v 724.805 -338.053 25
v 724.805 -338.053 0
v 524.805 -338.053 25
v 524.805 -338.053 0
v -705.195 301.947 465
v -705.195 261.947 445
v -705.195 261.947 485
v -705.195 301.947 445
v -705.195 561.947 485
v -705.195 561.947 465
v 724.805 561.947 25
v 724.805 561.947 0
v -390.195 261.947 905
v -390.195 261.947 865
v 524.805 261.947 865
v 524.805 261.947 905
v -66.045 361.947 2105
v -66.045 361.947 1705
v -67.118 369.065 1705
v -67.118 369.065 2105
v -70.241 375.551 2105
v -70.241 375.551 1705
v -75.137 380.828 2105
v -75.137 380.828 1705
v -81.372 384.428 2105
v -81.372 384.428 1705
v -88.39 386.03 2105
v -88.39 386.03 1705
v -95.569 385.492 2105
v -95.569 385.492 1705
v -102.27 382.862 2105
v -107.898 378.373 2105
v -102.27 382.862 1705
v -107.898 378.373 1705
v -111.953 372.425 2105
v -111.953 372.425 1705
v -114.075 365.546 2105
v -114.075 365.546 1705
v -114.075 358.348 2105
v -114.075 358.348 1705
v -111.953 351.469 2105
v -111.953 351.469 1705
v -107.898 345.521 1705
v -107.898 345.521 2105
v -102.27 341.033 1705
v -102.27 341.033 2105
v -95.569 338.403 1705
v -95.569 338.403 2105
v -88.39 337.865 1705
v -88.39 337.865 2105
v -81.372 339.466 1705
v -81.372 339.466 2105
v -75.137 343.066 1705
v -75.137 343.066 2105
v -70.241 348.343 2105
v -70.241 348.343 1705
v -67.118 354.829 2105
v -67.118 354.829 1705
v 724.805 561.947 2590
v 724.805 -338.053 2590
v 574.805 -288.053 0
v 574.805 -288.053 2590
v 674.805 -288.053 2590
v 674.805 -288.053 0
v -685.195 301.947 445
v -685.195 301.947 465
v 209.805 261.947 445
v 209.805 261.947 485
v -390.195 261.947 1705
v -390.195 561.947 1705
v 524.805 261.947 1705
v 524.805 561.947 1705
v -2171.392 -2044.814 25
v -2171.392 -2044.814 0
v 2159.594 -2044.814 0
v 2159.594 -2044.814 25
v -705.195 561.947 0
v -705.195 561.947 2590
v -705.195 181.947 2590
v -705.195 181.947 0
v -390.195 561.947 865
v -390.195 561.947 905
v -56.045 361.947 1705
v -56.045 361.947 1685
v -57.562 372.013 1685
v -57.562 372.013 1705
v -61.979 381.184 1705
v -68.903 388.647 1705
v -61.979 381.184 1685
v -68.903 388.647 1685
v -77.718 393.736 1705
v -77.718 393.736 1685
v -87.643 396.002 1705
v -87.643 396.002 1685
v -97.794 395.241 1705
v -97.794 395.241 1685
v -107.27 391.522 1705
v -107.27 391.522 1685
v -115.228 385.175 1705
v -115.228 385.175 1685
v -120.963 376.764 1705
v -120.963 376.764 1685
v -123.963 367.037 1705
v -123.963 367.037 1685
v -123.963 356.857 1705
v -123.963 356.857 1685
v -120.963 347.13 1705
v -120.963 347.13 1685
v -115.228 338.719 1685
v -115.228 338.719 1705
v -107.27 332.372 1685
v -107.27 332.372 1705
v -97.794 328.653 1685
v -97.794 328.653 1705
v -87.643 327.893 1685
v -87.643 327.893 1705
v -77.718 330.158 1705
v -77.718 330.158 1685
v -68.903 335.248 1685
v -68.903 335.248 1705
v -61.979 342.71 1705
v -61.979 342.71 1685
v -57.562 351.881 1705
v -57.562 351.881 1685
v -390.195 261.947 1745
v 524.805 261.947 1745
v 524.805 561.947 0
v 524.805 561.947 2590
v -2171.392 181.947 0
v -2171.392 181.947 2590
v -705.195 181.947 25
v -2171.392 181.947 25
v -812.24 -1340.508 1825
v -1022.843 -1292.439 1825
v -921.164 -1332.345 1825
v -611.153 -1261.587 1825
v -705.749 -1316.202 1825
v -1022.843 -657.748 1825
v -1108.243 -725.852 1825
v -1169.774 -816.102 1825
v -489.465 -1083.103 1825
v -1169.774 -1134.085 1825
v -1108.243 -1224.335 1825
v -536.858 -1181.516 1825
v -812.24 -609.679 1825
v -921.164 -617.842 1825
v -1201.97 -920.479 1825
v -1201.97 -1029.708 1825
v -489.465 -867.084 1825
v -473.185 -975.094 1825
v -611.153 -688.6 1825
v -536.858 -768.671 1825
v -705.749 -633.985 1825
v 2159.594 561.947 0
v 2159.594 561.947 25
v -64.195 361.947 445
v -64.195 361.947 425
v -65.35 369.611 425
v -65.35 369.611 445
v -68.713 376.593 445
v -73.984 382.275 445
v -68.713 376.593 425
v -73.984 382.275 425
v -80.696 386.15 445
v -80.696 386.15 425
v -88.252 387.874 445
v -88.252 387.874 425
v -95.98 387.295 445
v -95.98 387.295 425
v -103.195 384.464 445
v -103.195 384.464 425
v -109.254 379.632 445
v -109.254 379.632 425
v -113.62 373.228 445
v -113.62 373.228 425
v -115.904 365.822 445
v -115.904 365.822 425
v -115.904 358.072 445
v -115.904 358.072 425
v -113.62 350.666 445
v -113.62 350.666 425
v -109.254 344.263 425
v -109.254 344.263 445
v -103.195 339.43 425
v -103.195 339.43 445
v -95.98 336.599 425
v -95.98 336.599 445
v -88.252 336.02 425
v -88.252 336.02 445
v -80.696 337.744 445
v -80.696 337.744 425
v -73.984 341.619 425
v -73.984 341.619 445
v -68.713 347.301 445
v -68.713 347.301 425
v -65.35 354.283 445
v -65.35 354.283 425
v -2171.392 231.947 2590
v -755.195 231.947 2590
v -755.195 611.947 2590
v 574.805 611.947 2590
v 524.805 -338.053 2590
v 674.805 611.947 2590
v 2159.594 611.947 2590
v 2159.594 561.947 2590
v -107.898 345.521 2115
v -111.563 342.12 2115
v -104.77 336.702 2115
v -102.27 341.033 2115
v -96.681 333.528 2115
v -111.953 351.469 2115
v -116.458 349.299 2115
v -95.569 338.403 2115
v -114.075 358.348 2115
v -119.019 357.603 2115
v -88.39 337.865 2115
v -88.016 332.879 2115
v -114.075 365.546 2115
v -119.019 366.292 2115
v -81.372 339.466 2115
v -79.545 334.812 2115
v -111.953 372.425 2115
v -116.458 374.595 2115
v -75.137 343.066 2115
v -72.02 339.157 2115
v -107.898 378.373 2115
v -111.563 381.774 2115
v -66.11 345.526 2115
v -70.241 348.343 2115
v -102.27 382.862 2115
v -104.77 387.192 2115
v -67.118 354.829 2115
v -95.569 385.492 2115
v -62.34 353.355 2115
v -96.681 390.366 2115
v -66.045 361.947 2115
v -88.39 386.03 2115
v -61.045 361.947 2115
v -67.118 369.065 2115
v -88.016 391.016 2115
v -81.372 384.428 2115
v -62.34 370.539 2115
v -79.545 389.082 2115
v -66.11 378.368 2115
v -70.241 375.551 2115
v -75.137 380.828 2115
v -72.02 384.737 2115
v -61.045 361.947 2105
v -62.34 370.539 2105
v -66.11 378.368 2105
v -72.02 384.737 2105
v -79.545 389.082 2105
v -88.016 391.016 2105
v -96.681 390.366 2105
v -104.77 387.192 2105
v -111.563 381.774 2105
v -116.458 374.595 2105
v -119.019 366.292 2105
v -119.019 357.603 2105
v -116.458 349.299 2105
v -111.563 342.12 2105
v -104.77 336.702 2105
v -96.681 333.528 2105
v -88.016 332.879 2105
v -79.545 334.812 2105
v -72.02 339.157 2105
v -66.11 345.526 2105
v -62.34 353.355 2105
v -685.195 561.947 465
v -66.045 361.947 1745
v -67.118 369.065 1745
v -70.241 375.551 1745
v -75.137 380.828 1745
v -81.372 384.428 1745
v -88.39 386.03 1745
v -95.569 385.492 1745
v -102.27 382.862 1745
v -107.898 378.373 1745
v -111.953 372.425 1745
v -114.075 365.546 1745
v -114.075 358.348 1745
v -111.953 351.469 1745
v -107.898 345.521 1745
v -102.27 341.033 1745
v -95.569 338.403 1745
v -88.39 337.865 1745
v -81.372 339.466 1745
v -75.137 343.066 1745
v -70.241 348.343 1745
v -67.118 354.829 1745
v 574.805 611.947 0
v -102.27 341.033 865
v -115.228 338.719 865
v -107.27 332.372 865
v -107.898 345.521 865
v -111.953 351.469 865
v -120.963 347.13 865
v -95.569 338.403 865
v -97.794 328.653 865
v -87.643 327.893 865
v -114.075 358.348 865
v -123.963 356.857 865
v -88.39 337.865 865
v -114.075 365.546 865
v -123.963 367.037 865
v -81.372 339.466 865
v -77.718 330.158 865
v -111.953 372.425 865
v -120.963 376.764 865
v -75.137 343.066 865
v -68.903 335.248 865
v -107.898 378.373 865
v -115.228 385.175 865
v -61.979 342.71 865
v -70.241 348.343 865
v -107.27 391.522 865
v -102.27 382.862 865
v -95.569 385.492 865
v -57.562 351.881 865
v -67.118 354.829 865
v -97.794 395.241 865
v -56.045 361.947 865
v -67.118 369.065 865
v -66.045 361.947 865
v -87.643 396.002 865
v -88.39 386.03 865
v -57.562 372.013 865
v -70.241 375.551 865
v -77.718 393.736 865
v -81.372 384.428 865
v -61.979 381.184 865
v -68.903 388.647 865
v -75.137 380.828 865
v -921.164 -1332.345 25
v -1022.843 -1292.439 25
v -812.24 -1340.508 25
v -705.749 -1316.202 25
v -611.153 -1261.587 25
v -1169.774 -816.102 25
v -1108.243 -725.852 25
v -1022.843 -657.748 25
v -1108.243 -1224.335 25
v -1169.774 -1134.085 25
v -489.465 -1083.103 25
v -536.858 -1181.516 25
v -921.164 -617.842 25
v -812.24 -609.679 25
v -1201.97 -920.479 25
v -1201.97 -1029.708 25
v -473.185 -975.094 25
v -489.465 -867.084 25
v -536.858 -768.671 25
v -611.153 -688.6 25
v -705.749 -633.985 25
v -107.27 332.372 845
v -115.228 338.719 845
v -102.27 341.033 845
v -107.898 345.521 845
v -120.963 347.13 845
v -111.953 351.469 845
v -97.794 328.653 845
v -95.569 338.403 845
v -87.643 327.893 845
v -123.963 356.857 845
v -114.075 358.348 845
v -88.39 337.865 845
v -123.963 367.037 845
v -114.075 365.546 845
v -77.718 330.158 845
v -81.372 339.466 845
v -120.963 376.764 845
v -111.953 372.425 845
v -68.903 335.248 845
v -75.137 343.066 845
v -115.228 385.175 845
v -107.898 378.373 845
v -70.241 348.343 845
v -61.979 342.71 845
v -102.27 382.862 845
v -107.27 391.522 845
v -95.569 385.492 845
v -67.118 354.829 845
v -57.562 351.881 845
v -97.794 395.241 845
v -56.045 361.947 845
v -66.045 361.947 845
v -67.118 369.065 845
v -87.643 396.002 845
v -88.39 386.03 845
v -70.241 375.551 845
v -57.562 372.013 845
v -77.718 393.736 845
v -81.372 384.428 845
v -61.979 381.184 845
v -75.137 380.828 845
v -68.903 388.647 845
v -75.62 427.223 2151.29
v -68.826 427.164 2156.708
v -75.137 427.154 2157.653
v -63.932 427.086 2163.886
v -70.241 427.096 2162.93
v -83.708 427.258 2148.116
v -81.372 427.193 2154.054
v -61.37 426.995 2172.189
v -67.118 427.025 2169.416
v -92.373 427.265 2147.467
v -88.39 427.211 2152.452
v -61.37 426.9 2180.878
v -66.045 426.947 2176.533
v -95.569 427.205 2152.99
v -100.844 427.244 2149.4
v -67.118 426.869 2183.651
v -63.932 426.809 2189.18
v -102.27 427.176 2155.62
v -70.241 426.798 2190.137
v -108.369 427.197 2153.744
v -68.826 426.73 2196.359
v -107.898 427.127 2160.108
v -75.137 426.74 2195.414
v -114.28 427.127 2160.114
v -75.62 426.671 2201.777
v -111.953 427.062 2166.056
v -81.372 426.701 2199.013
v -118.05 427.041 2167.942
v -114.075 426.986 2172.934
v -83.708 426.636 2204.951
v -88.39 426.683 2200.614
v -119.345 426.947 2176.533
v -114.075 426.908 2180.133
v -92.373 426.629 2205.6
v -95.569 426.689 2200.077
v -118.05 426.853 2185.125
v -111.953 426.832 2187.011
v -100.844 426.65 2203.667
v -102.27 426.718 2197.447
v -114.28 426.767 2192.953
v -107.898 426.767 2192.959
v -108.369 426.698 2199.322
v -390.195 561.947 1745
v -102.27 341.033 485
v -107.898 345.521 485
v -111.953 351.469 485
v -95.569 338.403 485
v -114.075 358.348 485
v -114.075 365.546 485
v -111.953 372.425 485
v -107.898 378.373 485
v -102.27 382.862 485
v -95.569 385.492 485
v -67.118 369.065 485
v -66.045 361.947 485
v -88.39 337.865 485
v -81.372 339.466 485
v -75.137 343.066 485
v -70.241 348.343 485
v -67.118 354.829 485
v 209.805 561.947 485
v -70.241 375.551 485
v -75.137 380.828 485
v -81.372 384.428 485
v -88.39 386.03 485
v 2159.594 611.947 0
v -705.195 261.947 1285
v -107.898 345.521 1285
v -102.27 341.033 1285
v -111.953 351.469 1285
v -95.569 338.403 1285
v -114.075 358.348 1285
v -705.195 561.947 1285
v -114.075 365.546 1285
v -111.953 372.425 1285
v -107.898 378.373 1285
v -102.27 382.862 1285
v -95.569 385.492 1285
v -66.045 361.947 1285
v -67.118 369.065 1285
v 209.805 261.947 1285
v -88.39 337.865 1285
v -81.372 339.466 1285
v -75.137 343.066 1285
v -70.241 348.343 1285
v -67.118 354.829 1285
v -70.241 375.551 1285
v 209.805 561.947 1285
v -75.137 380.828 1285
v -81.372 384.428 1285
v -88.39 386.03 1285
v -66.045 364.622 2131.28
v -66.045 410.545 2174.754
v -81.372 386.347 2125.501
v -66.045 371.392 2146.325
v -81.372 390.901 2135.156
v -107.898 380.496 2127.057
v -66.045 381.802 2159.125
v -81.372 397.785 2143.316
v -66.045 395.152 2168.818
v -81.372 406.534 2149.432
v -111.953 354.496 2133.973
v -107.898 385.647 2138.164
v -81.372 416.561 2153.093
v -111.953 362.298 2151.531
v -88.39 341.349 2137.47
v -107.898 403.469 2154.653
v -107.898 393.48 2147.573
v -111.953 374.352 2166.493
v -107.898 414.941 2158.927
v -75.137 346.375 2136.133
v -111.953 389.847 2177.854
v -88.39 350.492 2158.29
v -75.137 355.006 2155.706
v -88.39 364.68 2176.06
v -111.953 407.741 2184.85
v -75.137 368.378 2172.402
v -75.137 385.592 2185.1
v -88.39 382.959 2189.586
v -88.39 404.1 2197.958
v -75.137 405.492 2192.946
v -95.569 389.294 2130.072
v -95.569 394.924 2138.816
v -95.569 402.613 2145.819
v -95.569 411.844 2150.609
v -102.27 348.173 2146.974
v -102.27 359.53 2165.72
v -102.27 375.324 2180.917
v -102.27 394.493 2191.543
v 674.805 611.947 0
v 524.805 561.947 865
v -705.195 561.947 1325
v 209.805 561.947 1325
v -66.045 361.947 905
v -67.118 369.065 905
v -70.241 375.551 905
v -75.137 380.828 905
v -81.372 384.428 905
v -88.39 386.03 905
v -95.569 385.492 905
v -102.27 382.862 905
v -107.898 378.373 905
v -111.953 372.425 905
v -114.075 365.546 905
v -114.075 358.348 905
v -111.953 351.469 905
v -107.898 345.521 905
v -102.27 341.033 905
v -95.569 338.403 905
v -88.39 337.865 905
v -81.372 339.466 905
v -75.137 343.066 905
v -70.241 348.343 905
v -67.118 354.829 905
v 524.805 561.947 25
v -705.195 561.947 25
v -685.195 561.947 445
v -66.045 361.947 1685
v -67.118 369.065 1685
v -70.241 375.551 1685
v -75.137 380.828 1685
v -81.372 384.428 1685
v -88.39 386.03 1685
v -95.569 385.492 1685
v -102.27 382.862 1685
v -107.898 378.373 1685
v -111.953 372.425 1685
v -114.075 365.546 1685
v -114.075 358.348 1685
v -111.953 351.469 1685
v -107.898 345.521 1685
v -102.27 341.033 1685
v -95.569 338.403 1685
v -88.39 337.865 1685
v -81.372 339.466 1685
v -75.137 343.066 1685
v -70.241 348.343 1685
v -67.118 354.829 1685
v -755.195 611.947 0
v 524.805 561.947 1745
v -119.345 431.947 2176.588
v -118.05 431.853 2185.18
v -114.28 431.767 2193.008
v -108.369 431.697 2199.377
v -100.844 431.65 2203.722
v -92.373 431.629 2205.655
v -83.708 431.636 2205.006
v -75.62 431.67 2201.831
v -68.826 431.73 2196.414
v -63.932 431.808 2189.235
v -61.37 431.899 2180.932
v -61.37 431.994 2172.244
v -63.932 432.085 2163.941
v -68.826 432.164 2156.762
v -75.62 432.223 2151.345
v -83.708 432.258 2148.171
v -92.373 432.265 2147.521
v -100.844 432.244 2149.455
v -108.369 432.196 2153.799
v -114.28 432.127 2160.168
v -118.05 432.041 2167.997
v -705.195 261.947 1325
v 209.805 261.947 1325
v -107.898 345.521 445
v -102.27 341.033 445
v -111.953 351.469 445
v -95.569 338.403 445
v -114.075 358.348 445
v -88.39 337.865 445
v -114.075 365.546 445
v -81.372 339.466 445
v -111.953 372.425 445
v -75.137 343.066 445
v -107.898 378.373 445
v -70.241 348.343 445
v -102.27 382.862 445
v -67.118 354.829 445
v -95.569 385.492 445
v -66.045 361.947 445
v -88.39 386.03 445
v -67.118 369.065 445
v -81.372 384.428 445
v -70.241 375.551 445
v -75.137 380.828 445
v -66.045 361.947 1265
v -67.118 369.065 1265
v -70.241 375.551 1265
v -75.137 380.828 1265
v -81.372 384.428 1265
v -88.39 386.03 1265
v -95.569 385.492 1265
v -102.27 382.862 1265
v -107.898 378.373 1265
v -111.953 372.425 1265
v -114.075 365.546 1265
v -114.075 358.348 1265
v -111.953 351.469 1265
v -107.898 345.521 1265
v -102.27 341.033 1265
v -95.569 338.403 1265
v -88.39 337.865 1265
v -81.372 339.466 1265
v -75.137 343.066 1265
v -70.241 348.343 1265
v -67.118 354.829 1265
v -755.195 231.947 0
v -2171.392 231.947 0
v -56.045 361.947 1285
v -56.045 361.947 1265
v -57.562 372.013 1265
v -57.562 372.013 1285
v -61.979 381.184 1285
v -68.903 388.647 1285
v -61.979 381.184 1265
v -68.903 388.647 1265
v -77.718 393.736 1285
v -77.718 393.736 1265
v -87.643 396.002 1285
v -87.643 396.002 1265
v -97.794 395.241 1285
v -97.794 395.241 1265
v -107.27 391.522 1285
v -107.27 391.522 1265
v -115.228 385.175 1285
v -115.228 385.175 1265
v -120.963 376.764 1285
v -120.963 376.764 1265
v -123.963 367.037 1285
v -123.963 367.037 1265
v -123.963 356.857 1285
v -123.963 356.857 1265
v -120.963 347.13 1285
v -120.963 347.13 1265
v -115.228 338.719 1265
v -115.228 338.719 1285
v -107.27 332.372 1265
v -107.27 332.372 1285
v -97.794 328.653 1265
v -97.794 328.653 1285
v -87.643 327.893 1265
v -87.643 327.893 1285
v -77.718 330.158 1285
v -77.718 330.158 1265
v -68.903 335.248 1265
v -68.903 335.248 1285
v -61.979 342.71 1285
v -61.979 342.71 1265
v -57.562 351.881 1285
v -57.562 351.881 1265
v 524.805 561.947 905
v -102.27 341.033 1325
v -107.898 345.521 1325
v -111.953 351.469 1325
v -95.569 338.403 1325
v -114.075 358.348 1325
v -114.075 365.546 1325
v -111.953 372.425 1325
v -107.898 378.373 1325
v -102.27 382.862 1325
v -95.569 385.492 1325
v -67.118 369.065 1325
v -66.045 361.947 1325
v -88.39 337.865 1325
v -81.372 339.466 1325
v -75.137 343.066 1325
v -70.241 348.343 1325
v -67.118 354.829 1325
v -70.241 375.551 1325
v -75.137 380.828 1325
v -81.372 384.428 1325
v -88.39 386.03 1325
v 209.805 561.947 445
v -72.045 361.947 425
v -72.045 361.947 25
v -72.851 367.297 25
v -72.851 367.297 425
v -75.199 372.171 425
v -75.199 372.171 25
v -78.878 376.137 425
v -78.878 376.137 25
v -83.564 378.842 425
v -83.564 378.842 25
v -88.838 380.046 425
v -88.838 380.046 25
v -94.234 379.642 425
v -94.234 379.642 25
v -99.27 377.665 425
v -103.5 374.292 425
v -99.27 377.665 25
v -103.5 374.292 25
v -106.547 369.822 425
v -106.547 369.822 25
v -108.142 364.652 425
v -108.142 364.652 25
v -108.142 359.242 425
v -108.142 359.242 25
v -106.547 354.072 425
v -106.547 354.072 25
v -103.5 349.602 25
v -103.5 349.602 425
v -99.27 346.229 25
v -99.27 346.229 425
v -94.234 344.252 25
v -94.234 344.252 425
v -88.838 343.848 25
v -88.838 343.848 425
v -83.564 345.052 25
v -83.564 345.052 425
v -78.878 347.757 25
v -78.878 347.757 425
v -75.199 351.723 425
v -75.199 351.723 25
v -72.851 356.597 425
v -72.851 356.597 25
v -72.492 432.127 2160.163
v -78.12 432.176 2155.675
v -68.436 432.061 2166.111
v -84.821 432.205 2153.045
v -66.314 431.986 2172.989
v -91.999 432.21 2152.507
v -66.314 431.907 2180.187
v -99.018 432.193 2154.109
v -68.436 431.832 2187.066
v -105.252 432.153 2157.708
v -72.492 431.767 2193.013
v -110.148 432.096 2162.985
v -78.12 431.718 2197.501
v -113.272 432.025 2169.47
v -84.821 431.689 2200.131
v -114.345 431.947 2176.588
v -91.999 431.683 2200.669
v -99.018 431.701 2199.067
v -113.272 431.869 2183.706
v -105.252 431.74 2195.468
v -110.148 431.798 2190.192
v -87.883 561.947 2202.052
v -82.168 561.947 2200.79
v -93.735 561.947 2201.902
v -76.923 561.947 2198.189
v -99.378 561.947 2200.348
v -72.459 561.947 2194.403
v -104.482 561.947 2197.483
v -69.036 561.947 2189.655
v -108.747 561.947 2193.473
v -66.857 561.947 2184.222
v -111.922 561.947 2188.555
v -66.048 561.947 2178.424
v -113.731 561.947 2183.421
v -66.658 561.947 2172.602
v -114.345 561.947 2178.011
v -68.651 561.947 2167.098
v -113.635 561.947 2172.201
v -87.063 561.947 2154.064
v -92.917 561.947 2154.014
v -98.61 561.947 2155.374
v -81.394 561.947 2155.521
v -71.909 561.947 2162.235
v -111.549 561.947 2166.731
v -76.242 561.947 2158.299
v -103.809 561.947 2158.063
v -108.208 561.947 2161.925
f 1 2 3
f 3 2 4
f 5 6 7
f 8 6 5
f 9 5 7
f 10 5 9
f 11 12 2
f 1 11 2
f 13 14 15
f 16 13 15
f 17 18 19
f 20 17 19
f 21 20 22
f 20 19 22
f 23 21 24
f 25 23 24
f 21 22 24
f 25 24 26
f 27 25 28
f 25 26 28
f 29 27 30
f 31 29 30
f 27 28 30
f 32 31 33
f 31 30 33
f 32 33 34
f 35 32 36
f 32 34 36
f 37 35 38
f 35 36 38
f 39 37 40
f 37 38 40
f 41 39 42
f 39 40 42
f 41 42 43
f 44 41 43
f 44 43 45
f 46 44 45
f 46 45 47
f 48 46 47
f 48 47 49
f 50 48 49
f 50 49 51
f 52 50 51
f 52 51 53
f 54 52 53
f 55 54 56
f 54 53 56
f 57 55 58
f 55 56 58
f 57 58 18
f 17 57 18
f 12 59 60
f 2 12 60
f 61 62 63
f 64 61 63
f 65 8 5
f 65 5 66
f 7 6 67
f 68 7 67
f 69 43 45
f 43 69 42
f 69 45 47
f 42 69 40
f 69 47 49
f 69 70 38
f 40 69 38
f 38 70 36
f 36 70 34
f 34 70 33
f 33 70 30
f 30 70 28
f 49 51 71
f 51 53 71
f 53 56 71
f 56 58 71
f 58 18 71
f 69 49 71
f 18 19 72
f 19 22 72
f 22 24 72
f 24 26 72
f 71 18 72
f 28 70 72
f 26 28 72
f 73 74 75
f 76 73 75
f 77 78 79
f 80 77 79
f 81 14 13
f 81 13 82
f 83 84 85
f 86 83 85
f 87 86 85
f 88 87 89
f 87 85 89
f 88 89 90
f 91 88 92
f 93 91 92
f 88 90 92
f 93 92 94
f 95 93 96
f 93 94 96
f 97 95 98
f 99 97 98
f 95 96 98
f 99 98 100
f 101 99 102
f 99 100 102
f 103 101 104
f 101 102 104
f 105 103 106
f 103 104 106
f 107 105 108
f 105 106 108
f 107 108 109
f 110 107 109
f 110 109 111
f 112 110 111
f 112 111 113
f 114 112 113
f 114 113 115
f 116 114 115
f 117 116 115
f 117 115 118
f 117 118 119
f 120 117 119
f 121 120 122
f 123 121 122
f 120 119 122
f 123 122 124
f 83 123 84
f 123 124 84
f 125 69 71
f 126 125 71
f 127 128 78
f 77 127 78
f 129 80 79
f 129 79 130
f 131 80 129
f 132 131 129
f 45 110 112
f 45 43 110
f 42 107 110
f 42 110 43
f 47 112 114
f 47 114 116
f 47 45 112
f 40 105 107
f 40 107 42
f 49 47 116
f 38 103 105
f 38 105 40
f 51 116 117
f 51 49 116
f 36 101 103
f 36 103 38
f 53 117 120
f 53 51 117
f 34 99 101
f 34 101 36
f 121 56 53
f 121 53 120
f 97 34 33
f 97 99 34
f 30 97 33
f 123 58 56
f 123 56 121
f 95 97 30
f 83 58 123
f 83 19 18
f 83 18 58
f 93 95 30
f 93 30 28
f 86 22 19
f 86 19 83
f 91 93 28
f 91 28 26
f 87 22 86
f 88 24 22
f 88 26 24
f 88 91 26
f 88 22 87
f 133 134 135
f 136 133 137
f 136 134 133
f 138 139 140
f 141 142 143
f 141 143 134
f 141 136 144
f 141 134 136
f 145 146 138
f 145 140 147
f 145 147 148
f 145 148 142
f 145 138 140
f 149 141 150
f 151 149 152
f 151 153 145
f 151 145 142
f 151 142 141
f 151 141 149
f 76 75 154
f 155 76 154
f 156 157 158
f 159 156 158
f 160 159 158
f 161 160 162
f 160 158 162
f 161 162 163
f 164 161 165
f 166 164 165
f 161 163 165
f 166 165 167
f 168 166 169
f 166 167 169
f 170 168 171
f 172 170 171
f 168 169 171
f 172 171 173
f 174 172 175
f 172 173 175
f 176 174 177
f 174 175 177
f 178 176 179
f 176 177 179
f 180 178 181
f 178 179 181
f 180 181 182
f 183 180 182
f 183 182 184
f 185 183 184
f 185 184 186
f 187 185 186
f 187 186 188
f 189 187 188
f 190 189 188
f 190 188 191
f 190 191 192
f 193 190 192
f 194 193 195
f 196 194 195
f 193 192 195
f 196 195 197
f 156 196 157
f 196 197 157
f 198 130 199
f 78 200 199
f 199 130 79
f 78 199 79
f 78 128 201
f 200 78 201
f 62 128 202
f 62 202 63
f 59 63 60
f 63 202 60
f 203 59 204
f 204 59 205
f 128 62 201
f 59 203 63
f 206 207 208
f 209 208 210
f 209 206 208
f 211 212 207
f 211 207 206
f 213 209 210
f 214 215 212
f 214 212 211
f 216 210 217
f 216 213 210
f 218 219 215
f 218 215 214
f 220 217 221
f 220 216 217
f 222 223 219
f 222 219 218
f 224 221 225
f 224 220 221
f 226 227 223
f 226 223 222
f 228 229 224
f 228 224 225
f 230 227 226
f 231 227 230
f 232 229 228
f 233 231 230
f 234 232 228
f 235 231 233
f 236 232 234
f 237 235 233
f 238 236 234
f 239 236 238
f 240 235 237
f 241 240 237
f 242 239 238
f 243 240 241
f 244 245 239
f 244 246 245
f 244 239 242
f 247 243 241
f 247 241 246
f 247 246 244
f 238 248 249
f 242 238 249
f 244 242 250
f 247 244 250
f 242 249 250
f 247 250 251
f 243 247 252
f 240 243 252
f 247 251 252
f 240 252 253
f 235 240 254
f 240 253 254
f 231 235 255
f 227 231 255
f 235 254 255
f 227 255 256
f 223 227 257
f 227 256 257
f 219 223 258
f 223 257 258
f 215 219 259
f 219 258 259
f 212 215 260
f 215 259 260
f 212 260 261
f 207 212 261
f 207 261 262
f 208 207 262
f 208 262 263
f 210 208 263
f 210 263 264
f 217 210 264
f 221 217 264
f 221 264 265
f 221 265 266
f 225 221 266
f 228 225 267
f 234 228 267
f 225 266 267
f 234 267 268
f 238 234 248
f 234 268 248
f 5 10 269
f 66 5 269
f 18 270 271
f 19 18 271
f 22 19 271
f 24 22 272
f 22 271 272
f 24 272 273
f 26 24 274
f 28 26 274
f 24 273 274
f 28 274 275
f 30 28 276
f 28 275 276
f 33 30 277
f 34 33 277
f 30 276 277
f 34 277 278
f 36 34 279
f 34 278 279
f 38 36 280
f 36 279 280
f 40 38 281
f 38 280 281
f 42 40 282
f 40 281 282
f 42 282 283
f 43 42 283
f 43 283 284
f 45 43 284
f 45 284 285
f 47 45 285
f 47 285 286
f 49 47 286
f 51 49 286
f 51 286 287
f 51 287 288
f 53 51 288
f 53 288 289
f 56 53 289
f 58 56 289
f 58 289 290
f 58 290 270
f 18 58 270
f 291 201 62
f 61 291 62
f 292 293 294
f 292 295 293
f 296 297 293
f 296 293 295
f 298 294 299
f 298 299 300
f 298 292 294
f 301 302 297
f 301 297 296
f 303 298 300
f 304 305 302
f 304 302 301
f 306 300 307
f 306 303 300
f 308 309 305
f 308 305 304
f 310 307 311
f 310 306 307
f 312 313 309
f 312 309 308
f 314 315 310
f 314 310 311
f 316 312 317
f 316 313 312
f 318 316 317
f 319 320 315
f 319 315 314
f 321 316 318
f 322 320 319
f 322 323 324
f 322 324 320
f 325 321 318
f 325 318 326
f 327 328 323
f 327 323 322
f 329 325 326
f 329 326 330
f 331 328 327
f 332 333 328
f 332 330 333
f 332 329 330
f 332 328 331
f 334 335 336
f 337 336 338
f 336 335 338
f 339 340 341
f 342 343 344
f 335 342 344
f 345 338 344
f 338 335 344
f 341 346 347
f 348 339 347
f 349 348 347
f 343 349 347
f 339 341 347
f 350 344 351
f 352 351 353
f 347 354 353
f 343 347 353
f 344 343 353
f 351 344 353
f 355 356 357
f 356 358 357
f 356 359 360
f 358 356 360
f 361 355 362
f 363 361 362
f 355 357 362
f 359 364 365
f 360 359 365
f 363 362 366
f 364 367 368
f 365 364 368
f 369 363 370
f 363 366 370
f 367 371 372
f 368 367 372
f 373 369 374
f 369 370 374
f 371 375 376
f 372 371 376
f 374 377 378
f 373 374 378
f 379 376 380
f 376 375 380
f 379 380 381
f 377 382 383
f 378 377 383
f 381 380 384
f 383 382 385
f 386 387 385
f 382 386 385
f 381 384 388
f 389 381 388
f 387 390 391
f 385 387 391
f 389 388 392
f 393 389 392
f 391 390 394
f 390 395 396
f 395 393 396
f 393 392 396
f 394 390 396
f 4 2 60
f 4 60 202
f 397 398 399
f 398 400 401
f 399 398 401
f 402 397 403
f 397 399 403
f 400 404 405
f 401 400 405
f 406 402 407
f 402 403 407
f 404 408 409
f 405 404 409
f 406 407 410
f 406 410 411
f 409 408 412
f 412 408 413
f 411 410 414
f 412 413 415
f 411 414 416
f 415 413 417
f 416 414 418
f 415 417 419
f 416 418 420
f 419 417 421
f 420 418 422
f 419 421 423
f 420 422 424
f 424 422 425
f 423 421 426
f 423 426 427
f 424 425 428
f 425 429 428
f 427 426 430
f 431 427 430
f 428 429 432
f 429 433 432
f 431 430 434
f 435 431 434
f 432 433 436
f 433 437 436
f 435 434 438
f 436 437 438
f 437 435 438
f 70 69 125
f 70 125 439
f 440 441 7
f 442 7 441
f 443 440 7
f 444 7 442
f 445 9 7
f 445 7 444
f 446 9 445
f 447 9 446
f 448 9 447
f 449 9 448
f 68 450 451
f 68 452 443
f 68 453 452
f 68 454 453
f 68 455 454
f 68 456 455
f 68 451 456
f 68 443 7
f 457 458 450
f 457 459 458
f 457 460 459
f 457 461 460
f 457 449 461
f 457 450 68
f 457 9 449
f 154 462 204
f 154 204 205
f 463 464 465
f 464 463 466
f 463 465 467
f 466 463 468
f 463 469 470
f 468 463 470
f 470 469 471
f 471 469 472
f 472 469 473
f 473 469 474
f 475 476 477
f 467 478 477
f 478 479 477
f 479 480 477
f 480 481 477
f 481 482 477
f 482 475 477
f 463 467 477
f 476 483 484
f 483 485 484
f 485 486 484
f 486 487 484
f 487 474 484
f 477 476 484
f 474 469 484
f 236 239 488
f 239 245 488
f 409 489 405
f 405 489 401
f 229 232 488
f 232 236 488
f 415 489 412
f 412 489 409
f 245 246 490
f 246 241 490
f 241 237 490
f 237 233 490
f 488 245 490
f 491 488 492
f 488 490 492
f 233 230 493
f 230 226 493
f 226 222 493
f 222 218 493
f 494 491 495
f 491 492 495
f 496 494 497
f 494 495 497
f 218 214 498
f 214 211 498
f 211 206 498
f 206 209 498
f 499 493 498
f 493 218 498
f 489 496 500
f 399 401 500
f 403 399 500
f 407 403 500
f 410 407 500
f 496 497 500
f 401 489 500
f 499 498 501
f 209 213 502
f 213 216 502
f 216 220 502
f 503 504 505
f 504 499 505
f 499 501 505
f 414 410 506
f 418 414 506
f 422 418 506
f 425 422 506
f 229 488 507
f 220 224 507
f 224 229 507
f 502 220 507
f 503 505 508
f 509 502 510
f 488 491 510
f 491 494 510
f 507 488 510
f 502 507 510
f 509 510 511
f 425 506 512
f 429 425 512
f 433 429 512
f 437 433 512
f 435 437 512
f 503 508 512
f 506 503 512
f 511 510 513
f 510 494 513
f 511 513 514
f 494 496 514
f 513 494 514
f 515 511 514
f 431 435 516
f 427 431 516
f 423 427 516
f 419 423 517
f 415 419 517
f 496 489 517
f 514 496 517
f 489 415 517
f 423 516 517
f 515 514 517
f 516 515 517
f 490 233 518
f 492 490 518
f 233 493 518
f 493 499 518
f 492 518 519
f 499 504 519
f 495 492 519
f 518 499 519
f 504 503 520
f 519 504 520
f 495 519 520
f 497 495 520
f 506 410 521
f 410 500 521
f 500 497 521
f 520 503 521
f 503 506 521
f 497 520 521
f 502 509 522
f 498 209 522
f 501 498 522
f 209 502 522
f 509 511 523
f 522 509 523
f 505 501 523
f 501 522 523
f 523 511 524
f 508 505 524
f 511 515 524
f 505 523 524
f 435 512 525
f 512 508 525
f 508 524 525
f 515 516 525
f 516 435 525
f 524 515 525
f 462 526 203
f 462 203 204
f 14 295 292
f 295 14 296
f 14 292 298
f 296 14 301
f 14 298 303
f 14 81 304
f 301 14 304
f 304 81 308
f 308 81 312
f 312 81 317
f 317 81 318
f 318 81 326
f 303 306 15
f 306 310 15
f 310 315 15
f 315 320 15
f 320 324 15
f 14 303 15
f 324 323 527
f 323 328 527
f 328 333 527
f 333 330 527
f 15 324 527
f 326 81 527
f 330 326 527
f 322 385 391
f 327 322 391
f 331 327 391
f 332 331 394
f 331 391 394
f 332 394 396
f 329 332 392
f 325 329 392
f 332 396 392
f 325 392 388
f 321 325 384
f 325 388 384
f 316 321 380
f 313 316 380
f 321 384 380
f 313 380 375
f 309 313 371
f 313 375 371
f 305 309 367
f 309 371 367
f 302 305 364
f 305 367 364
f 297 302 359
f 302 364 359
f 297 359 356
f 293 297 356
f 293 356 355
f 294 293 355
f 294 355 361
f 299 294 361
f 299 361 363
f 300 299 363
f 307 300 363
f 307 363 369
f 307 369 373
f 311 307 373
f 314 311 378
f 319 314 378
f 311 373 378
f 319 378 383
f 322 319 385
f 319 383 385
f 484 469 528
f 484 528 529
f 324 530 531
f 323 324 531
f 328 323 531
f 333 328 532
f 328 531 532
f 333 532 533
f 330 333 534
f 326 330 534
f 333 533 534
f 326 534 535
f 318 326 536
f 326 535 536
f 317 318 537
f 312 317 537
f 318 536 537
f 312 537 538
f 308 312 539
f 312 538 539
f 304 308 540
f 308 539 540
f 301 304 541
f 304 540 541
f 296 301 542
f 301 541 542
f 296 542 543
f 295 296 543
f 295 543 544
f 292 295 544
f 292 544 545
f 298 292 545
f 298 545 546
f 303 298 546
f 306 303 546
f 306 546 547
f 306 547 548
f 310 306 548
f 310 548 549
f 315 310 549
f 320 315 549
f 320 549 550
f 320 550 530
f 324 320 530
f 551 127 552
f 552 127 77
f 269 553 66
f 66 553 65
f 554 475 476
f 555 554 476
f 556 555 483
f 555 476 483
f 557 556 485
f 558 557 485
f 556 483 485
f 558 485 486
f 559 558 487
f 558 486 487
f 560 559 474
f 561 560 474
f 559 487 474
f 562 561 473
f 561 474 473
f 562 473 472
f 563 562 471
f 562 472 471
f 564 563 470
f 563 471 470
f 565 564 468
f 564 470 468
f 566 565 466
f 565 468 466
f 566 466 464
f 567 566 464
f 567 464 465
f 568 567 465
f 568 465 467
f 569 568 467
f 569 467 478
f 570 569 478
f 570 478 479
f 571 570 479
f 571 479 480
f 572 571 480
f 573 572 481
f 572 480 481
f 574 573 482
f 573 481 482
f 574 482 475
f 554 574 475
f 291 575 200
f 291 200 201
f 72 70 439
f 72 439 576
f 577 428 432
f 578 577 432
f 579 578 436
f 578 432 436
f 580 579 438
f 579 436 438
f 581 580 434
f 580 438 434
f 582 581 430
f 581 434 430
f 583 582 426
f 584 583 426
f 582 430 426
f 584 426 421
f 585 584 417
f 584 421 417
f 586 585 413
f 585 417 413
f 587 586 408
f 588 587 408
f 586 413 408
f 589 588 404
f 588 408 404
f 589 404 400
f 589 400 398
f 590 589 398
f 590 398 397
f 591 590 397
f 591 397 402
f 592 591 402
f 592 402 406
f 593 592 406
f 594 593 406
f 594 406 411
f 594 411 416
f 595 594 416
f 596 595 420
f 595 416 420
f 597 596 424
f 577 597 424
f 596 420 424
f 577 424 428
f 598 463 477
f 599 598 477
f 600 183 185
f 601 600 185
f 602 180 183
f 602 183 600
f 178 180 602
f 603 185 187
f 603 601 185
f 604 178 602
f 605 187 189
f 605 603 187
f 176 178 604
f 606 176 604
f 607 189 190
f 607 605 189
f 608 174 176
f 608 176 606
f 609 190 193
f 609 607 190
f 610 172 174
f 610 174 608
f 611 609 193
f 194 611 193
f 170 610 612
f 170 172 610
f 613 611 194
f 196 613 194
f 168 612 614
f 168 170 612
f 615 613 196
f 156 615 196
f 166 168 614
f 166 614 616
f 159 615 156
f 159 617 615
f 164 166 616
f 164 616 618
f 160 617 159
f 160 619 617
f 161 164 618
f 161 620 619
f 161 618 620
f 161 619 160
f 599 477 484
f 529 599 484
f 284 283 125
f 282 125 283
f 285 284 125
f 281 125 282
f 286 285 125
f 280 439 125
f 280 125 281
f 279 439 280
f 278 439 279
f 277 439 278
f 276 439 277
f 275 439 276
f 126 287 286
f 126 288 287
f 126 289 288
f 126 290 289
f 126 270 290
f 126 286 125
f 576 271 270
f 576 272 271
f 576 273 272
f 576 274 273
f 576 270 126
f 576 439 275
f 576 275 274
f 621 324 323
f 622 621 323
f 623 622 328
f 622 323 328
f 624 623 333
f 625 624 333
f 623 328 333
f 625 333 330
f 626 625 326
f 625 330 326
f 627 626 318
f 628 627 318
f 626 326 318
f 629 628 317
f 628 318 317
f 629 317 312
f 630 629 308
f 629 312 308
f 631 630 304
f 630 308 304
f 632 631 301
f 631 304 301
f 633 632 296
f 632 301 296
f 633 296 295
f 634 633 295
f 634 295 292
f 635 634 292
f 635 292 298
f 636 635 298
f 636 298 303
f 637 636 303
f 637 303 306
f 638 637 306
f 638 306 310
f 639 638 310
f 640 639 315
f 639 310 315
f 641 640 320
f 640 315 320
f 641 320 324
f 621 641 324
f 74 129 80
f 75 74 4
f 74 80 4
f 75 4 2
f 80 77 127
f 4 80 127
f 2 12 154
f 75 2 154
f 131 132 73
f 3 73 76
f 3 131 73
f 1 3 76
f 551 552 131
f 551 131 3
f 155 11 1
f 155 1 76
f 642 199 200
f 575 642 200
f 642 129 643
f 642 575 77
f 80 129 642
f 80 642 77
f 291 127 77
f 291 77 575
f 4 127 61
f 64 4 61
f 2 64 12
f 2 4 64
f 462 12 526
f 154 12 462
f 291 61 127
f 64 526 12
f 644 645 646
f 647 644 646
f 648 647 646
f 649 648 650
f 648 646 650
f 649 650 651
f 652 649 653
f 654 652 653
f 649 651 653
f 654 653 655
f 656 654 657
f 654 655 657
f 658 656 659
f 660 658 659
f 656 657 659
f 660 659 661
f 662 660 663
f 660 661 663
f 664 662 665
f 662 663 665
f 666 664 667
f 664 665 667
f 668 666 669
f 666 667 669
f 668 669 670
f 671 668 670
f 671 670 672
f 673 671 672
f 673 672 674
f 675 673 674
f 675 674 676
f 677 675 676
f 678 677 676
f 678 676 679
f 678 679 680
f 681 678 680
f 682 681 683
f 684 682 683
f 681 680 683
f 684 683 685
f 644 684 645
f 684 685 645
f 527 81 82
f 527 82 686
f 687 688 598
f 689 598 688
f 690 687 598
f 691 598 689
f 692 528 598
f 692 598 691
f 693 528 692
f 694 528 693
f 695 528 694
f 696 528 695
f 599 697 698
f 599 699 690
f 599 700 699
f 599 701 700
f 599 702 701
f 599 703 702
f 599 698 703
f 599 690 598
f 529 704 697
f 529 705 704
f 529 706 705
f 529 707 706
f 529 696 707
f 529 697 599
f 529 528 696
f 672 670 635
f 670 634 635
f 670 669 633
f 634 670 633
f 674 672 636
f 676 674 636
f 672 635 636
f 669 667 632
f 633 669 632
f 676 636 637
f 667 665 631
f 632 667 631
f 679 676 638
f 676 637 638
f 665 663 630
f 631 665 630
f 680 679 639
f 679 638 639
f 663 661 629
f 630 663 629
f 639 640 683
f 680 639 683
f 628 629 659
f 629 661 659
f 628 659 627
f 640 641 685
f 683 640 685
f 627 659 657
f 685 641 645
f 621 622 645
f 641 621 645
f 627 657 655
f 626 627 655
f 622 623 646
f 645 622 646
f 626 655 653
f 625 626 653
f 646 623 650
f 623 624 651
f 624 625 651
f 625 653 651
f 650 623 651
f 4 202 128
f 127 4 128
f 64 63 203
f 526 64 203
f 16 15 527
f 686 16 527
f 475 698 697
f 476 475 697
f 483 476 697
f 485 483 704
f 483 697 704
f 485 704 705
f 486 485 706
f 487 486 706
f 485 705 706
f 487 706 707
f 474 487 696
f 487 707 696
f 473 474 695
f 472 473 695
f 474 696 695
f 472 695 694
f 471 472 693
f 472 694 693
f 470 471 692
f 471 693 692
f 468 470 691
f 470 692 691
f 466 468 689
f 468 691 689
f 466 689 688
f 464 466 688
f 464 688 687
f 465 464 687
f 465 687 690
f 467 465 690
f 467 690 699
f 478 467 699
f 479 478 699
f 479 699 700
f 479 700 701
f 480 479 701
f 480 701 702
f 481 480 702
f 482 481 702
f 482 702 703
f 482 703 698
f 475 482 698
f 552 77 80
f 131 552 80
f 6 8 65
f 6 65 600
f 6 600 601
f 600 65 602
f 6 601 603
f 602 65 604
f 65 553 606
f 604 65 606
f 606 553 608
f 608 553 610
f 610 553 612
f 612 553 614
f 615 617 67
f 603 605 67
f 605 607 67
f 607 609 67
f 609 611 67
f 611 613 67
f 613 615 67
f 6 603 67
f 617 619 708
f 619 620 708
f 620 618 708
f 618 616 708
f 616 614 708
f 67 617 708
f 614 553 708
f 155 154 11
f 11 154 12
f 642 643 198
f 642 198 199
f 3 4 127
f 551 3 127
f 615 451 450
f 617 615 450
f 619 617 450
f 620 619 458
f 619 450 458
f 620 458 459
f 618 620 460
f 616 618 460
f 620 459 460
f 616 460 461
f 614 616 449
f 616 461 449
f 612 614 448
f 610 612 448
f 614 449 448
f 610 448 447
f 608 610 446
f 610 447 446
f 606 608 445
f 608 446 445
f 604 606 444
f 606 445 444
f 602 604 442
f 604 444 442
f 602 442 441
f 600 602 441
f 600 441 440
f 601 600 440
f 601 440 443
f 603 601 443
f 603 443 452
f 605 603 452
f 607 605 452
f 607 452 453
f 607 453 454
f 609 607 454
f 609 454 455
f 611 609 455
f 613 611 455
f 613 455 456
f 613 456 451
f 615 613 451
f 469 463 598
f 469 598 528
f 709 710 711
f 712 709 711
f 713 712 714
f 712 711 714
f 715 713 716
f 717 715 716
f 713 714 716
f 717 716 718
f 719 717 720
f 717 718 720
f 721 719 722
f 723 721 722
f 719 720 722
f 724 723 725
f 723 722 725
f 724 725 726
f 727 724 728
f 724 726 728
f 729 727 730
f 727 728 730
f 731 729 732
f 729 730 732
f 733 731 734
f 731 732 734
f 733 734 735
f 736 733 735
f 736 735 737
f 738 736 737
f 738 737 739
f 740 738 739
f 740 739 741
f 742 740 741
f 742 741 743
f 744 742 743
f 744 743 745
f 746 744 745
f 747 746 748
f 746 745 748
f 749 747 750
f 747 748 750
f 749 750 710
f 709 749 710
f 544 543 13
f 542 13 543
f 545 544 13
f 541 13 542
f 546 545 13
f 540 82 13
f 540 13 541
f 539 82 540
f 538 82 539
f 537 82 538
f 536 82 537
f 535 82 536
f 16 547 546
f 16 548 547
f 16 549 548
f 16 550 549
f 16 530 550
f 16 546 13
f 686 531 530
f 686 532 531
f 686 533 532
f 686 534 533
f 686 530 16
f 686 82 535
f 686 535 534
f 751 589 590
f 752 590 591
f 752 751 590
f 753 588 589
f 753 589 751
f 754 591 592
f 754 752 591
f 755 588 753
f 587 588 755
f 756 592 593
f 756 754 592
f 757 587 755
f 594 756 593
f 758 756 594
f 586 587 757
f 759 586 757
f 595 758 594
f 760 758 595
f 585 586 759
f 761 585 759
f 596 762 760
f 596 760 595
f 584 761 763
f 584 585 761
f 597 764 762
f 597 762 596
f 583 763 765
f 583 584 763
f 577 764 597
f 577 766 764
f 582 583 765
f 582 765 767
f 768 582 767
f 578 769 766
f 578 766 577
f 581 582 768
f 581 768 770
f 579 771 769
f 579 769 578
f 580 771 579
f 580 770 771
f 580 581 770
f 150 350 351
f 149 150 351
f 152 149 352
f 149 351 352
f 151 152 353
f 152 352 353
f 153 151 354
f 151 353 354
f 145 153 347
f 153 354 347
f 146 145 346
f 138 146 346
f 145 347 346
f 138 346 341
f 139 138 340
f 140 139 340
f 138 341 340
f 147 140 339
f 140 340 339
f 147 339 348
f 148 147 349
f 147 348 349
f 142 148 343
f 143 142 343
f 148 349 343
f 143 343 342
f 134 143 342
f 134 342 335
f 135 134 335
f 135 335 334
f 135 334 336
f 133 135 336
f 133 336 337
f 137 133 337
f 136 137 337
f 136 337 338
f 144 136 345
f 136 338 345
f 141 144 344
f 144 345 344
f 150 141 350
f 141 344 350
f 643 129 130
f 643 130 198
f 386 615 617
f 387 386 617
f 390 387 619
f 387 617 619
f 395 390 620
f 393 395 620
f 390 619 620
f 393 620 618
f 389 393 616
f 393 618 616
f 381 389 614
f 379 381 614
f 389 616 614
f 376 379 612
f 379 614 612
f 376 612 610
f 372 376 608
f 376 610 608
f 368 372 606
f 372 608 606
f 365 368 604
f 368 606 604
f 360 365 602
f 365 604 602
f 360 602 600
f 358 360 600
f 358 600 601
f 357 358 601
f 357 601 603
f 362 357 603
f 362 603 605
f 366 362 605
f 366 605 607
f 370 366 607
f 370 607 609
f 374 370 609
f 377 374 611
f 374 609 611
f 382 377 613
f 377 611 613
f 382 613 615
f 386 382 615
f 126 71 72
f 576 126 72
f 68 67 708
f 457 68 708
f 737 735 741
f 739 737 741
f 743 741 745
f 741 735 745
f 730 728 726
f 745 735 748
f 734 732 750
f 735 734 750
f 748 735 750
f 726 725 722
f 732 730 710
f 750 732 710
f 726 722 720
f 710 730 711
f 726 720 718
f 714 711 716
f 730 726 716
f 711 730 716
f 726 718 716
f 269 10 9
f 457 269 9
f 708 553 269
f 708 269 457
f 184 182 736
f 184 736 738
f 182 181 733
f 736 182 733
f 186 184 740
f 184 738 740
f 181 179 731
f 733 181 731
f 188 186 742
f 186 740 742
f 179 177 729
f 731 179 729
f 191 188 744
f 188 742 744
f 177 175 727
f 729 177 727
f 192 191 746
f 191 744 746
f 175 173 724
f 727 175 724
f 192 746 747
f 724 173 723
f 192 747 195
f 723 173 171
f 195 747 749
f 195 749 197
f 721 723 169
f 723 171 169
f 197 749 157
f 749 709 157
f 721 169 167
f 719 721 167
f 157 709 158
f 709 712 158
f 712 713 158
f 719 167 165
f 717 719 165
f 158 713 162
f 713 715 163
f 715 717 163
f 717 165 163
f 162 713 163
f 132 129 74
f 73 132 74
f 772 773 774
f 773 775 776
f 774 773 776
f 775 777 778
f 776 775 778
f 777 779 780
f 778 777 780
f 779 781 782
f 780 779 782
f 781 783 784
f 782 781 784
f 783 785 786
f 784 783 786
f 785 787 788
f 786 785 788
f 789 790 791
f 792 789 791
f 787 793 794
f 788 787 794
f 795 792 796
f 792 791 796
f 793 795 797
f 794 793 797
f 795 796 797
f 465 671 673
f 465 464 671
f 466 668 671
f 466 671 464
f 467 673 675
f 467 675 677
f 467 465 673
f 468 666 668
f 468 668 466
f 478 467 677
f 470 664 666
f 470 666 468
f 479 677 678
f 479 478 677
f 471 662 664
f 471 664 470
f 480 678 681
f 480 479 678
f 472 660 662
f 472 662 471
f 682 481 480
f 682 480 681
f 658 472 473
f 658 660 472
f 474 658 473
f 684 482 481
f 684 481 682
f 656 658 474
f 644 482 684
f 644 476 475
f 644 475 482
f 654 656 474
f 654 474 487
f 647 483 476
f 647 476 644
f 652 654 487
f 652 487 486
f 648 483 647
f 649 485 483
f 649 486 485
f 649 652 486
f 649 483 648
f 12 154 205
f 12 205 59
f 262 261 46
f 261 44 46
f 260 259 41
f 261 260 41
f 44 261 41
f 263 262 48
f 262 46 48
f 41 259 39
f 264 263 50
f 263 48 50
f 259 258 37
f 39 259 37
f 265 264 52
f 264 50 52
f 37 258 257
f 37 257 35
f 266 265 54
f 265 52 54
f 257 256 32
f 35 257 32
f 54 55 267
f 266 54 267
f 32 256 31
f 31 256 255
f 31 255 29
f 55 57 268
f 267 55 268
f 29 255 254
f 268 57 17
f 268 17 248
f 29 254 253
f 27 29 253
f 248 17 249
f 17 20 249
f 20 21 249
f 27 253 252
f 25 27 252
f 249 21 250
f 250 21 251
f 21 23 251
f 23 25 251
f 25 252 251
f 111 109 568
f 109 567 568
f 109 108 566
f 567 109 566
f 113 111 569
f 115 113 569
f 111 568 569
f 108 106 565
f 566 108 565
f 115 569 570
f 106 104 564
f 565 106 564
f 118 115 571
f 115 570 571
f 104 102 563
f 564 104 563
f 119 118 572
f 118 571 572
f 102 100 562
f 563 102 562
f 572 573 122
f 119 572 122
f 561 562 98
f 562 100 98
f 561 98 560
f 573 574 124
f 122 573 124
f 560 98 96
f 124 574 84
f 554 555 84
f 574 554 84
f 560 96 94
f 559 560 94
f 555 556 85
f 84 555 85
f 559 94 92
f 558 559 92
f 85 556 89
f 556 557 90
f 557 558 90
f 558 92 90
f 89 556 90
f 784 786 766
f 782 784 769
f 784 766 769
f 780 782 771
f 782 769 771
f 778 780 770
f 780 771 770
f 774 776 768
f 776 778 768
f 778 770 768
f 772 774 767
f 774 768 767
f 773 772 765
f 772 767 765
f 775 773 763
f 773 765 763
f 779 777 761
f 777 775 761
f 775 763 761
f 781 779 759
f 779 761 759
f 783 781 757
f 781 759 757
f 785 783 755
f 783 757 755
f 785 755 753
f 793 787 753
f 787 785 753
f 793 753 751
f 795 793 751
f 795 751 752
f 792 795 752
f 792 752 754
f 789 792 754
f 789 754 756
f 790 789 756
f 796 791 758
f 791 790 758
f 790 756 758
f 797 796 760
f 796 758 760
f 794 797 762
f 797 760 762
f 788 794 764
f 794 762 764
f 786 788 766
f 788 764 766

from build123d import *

# Parameters (mm, degrees)
F1_DEPTH  = 25
F3_DEPTH  = 2590
F9_W      = 915
F9_H      = 300
F10_DEPTH = 40
F11_W     = 915
F11_H     = 300
F12_DEPTH = 40
F13_W     = 915
F13_H     = 300
F14_DEPTH = 40
F15_W     = 915
F15_H     = 300
F16_DEPTH = 40
F17_R     = 18.15
F18_DEPTH = 400
F19_R     = 24.15
F20_DEPTH = 1320
F21_R     = 26
F22_DEPTH = 20
F23_R     = 24.15
F24_DEPTH = 400
F25_R     = 34.15
F26_DEPTH = 20
F27_R     = 24.15
F28_DEPTH = 400
F29_R     = 34.15
F30_DEPTH = 20
F31_R     = 24.15
F32_DEPTH = 400
F33_R     = 34.15
F34_DEPTH = 20
F35_R     = 24.15
F36_DEPTH = 400
F37_R     = 29.15
F38_DEPTH = 10
F42_R     = 24.15
F47_R     = 29.15
F48_DEPTH = 5
F49_R     = 24.15
F50_REACH = 252.8226248047
F51_R     = 366.4389442896
F52_DEPTH = 1800
F53_W     = 20
F53_H     = 260
F54_DEPTH = 20


with BuildPart() as f1:
    # F0 (on Top) → F1 (new body)
    with BuildSketch(Plane.XY):
        Polygon((-705.1947621593, 181.9470898961), (-2171.3920796187, 181.9470898961), (-2171.3920796187, -2044.813666757), (2159.594360915, -2044.813666757), (2159.594360915, 561.9470898961), (724.8052378407, 561.9470898961), (724.8052378407, -338.0529101039), (524.8052378407, -338.0529101039), (524.8052378407, 561.9470898961), (-705.1947621593, 561.9470898961), align=None)
    extrude(amount=F1_DEPTH)


with BuildPart() as f3:
    # F2 (on face) → F3 (new body)
    with BuildSketch(Plane(origin=(0, 0, 0), x_dir=(1, 0, 0), z_dir=(0, 0, -1))):
        Polygon((-705.1947621593, -181.9470898961), (-2171.3920796187, -181.9470898961), (-2171.3920796187, -231.9470898961), (-755.1947621593, -231.9470898961), (-755.1947621593, -611.9470898961), (574.8052378407, -611.9470898961), (574.8052378407, 288.0529101039), (674.8052378407, 288.0529101039), (674.8052378407, -611.9470898961), (2159.594360915, -611.9470898961), (2159.594360915, -561.9470898961), (724.8052378407, -561.9470898961), (724.8052378407, 338.0529101039), (524.8052378407, 338.0529101039), (524.8052378407, -561.9470898961), (-705.1947621593, -561.9470898961), align=None)
    extrude(amount=-F3_DEPTH)


with BuildPart() as f10:
    # F9 (on offset) → F10 (new body)
    with BuildSketch(Plane.XY.offset(445)):
        with Locations((-247.6947621593, 411.9470898961)):
            Rectangle(F9_W, F9_H)
    extrude(amount=F10_DEPTH)


with BuildPart() as f12:
    # F11 (on offset) → F12 (new body)
    with BuildSketch(Plane.XY.offset(865)):
        with Locations((67.3052378407, 411.9470898961)):
            Rectangle(F11_W, F11_H)
    extrude(amount=F12_DEPTH)


with BuildPart() as f14:
    # F13 (on offset) → F14 (new body)
    with BuildSketch(Plane.XY.offset(1285)):
        with Locations((-247.6947621593, 411.9470898961)):
            Rectangle(F13_W, F13_H)
    extrude(amount=F14_DEPTH)


with BuildPart() as f16:
    # F15 (on offset) → F16 (new body)
    with BuildSketch(Plane.XY.offset(1705)):
        with Locations((67.3052378407, 411.9470898961)):
            Rectangle(F15_W, F15_H)
    extrude(amount=F16_DEPTH)


with BuildPart() as f18:
    # F17 (on face) → F18 (new body)
    with BuildSketch(Plane.XY.offset(25)):
        with Locations((-90.1947621593, 361.9470898961)):
            Circle(F17_R)
    extrude(amount=F18_DEPTH)

    # F21 (on face) → F22 (join)
    with BuildSketch(Plane.XY.offset(425)):
        with Locations((-90.1947621593, 361.9470898961)):
            Circle(F21_R)
    extrude(amount=F22_DEPTH)

    # F23 (on face) → F24 (join)
    with BuildSketch(Plane.XY.offset(445)):
        with Locations((-90.1947621593, 361.9470898961)):
            Circle(F23_R)
    extrude(amount=F24_DEPTH)

    # F25 (on face) → F26 (join)
    with BuildSketch(Plane.XY.offset(845)):
        with Locations((-90.1947621593, 361.9470898961)):
            Circle(F25_R)
    extrude(amount=F26_DEPTH)

    # F27 (on face) → F28 (join)
    with BuildSketch(Plane.XY.offset(865)):
        with Locations((-90.1947621593, 361.9470898961)):
            Circle(F27_R)
    extrude(amount=F28_DEPTH)

    # F29 (on face) → F30 (join)
    with BuildSketch(Plane.XY.offset(1265)):
        with Locations((-90.1947621593, 361.9470898961)):
            Circle(F29_R)
    extrude(amount=F30_DEPTH)

    # F31 (on face) → F32 (join)
    with BuildSketch(Plane.XY.offset(1285)):
        with Locations((-90.1947621593, 361.9470898961)):
            Circle(F31_R)
    extrude(amount=F32_DEPTH)

    # F33 (on face) → F34 (join)
    with BuildSketch(Plane.XY.offset(1685)):
        with Locations((-90.1947621593, 361.9470898961)):
            Circle(F33_R)
    extrude(amount=F34_DEPTH)

    # F35 (on face) → F36 (join)
    with BuildSketch(Plane.XY.offset(1705)):
        with Locations((-90.1947621593, 361.9470898961)):
            Circle(F35_R)
    extrude(amount=F36_DEPTH)

    # F37 (on face) → F38 (join)
    with BuildSketch(Plane.XY.offset(2105)):
        with Locations((-90.1947621593, 361.9470898961)):
            Circle(F37_R)
    extrude(amount=F38_DEPTH)

    # F46: sweep along a path in F45
    with BuildLine(Plane(origin=(-90.1947621593, 0, 0), x_dir=(0, -1, 0), z_dir=(-1, 0, 0))) as f46_path:
        ThreePointArc((-361.9470898961, 2115), (-381.8016351531, 2159.12457081), (-426.9470898961, 2176.5334373028))
    # F42 (on face) → F46 (sweep)
    with BuildSketch(Plane.XY.offset(2115)):
        with Locations((-90.1947621593, 361.9470898961)):
            Circle(F42_R)
    sweep(path=f46_path.line)

    # F47 (on face) → F48 (join)
    with BuildSketch(Plane(origin=(0, 450.7208860992, 4.9343114773), x_dir=(-1, 0, 0), z_dir=(0, 0.9999400804, 0.0109469429))):
        with Locations((90.1947621593, 2171.7292549193)):
            Circle(F47_R)
    extrude(amount=F48_DEPTH)

    f50_end = f3.part.faces().sort_by_distance((-90.1947621593, 561.9470898961, 1295))[0]
    # F49 (on face) → F50 (join, up to a face of F3 that its end follows)
    with BuildSketch(Plane(origin=(0, 455.7205865013, 4.9890461919), x_dir=(-1, 0, 0), z_dir=(0, 0.9999400804, 0.0109469429))):
        with Locations((90.1947621593, 2171.7292549193)):
            Circle(F49_R)
    f50_long = extrude(amount=F50_REACH, mode=Mode.PRIVATE)
    add(split(f50_long, bisect_by=f50_end, keep=Keep.TOP, mode=Mode.PRIVATE))


with BuildPart() as f20_tool:
    # F19 (on face) → F20 (new body)
    with BuildSketch(Plane.XY.offset(1745)):
        with Locations((-90.1947621593, 361.9470898961)):
            Circle(F19_R)
    extrude(amount=-F20_DEPTH)


with BuildPart() as f10_1:
    add(f10.part)

    # F20: cut by f20_tool
    add(f20_tool.part, mode=Mode.SUBTRACT)

    # F53 (on face) → F54 (cut)
    with BuildSketch(Plane(origin=(0, 0, 445), x_dir=(1, 0, 0), z_dir=(0, 0, -1))):
        with Locations((-695.1947621593, -431.9470898961)):
            Rectangle(F53_W, F53_H)
    extrude(amount=-F54_DEPTH, mode=Mode.SUBTRACT)


with BuildPart() as f12_1:
    add(f12.part)

    # F20: cut by f20_tool
    add(f20_tool.part, mode=Mode.SUBTRACT)


with BuildPart() as f14_1:
    add(f14.part)

    # F20: cut by f20_tool
    add(f20_tool.part, mode=Mode.SUBTRACT)


with BuildPart() as f16_1:
    add(f16.part)

    # F20: cut by f20_tool
    add(f20_tool.part, mode=Mode.SUBTRACT)


with BuildPart() as f52:
    # F51 (on face) → F52 (new body)
    with BuildSketch(Plane.XY.offset(25)):
        with Locations((-839.6239876747, -975.0935435295)):
            Circle(F51_R)
    extrude(amount=F52_DEPTH)


solid = Compound([f1.part, f3.part, f18.part, f10_1.part, f12_1.part, f14_1.part, f16_1.part, f52.part])
